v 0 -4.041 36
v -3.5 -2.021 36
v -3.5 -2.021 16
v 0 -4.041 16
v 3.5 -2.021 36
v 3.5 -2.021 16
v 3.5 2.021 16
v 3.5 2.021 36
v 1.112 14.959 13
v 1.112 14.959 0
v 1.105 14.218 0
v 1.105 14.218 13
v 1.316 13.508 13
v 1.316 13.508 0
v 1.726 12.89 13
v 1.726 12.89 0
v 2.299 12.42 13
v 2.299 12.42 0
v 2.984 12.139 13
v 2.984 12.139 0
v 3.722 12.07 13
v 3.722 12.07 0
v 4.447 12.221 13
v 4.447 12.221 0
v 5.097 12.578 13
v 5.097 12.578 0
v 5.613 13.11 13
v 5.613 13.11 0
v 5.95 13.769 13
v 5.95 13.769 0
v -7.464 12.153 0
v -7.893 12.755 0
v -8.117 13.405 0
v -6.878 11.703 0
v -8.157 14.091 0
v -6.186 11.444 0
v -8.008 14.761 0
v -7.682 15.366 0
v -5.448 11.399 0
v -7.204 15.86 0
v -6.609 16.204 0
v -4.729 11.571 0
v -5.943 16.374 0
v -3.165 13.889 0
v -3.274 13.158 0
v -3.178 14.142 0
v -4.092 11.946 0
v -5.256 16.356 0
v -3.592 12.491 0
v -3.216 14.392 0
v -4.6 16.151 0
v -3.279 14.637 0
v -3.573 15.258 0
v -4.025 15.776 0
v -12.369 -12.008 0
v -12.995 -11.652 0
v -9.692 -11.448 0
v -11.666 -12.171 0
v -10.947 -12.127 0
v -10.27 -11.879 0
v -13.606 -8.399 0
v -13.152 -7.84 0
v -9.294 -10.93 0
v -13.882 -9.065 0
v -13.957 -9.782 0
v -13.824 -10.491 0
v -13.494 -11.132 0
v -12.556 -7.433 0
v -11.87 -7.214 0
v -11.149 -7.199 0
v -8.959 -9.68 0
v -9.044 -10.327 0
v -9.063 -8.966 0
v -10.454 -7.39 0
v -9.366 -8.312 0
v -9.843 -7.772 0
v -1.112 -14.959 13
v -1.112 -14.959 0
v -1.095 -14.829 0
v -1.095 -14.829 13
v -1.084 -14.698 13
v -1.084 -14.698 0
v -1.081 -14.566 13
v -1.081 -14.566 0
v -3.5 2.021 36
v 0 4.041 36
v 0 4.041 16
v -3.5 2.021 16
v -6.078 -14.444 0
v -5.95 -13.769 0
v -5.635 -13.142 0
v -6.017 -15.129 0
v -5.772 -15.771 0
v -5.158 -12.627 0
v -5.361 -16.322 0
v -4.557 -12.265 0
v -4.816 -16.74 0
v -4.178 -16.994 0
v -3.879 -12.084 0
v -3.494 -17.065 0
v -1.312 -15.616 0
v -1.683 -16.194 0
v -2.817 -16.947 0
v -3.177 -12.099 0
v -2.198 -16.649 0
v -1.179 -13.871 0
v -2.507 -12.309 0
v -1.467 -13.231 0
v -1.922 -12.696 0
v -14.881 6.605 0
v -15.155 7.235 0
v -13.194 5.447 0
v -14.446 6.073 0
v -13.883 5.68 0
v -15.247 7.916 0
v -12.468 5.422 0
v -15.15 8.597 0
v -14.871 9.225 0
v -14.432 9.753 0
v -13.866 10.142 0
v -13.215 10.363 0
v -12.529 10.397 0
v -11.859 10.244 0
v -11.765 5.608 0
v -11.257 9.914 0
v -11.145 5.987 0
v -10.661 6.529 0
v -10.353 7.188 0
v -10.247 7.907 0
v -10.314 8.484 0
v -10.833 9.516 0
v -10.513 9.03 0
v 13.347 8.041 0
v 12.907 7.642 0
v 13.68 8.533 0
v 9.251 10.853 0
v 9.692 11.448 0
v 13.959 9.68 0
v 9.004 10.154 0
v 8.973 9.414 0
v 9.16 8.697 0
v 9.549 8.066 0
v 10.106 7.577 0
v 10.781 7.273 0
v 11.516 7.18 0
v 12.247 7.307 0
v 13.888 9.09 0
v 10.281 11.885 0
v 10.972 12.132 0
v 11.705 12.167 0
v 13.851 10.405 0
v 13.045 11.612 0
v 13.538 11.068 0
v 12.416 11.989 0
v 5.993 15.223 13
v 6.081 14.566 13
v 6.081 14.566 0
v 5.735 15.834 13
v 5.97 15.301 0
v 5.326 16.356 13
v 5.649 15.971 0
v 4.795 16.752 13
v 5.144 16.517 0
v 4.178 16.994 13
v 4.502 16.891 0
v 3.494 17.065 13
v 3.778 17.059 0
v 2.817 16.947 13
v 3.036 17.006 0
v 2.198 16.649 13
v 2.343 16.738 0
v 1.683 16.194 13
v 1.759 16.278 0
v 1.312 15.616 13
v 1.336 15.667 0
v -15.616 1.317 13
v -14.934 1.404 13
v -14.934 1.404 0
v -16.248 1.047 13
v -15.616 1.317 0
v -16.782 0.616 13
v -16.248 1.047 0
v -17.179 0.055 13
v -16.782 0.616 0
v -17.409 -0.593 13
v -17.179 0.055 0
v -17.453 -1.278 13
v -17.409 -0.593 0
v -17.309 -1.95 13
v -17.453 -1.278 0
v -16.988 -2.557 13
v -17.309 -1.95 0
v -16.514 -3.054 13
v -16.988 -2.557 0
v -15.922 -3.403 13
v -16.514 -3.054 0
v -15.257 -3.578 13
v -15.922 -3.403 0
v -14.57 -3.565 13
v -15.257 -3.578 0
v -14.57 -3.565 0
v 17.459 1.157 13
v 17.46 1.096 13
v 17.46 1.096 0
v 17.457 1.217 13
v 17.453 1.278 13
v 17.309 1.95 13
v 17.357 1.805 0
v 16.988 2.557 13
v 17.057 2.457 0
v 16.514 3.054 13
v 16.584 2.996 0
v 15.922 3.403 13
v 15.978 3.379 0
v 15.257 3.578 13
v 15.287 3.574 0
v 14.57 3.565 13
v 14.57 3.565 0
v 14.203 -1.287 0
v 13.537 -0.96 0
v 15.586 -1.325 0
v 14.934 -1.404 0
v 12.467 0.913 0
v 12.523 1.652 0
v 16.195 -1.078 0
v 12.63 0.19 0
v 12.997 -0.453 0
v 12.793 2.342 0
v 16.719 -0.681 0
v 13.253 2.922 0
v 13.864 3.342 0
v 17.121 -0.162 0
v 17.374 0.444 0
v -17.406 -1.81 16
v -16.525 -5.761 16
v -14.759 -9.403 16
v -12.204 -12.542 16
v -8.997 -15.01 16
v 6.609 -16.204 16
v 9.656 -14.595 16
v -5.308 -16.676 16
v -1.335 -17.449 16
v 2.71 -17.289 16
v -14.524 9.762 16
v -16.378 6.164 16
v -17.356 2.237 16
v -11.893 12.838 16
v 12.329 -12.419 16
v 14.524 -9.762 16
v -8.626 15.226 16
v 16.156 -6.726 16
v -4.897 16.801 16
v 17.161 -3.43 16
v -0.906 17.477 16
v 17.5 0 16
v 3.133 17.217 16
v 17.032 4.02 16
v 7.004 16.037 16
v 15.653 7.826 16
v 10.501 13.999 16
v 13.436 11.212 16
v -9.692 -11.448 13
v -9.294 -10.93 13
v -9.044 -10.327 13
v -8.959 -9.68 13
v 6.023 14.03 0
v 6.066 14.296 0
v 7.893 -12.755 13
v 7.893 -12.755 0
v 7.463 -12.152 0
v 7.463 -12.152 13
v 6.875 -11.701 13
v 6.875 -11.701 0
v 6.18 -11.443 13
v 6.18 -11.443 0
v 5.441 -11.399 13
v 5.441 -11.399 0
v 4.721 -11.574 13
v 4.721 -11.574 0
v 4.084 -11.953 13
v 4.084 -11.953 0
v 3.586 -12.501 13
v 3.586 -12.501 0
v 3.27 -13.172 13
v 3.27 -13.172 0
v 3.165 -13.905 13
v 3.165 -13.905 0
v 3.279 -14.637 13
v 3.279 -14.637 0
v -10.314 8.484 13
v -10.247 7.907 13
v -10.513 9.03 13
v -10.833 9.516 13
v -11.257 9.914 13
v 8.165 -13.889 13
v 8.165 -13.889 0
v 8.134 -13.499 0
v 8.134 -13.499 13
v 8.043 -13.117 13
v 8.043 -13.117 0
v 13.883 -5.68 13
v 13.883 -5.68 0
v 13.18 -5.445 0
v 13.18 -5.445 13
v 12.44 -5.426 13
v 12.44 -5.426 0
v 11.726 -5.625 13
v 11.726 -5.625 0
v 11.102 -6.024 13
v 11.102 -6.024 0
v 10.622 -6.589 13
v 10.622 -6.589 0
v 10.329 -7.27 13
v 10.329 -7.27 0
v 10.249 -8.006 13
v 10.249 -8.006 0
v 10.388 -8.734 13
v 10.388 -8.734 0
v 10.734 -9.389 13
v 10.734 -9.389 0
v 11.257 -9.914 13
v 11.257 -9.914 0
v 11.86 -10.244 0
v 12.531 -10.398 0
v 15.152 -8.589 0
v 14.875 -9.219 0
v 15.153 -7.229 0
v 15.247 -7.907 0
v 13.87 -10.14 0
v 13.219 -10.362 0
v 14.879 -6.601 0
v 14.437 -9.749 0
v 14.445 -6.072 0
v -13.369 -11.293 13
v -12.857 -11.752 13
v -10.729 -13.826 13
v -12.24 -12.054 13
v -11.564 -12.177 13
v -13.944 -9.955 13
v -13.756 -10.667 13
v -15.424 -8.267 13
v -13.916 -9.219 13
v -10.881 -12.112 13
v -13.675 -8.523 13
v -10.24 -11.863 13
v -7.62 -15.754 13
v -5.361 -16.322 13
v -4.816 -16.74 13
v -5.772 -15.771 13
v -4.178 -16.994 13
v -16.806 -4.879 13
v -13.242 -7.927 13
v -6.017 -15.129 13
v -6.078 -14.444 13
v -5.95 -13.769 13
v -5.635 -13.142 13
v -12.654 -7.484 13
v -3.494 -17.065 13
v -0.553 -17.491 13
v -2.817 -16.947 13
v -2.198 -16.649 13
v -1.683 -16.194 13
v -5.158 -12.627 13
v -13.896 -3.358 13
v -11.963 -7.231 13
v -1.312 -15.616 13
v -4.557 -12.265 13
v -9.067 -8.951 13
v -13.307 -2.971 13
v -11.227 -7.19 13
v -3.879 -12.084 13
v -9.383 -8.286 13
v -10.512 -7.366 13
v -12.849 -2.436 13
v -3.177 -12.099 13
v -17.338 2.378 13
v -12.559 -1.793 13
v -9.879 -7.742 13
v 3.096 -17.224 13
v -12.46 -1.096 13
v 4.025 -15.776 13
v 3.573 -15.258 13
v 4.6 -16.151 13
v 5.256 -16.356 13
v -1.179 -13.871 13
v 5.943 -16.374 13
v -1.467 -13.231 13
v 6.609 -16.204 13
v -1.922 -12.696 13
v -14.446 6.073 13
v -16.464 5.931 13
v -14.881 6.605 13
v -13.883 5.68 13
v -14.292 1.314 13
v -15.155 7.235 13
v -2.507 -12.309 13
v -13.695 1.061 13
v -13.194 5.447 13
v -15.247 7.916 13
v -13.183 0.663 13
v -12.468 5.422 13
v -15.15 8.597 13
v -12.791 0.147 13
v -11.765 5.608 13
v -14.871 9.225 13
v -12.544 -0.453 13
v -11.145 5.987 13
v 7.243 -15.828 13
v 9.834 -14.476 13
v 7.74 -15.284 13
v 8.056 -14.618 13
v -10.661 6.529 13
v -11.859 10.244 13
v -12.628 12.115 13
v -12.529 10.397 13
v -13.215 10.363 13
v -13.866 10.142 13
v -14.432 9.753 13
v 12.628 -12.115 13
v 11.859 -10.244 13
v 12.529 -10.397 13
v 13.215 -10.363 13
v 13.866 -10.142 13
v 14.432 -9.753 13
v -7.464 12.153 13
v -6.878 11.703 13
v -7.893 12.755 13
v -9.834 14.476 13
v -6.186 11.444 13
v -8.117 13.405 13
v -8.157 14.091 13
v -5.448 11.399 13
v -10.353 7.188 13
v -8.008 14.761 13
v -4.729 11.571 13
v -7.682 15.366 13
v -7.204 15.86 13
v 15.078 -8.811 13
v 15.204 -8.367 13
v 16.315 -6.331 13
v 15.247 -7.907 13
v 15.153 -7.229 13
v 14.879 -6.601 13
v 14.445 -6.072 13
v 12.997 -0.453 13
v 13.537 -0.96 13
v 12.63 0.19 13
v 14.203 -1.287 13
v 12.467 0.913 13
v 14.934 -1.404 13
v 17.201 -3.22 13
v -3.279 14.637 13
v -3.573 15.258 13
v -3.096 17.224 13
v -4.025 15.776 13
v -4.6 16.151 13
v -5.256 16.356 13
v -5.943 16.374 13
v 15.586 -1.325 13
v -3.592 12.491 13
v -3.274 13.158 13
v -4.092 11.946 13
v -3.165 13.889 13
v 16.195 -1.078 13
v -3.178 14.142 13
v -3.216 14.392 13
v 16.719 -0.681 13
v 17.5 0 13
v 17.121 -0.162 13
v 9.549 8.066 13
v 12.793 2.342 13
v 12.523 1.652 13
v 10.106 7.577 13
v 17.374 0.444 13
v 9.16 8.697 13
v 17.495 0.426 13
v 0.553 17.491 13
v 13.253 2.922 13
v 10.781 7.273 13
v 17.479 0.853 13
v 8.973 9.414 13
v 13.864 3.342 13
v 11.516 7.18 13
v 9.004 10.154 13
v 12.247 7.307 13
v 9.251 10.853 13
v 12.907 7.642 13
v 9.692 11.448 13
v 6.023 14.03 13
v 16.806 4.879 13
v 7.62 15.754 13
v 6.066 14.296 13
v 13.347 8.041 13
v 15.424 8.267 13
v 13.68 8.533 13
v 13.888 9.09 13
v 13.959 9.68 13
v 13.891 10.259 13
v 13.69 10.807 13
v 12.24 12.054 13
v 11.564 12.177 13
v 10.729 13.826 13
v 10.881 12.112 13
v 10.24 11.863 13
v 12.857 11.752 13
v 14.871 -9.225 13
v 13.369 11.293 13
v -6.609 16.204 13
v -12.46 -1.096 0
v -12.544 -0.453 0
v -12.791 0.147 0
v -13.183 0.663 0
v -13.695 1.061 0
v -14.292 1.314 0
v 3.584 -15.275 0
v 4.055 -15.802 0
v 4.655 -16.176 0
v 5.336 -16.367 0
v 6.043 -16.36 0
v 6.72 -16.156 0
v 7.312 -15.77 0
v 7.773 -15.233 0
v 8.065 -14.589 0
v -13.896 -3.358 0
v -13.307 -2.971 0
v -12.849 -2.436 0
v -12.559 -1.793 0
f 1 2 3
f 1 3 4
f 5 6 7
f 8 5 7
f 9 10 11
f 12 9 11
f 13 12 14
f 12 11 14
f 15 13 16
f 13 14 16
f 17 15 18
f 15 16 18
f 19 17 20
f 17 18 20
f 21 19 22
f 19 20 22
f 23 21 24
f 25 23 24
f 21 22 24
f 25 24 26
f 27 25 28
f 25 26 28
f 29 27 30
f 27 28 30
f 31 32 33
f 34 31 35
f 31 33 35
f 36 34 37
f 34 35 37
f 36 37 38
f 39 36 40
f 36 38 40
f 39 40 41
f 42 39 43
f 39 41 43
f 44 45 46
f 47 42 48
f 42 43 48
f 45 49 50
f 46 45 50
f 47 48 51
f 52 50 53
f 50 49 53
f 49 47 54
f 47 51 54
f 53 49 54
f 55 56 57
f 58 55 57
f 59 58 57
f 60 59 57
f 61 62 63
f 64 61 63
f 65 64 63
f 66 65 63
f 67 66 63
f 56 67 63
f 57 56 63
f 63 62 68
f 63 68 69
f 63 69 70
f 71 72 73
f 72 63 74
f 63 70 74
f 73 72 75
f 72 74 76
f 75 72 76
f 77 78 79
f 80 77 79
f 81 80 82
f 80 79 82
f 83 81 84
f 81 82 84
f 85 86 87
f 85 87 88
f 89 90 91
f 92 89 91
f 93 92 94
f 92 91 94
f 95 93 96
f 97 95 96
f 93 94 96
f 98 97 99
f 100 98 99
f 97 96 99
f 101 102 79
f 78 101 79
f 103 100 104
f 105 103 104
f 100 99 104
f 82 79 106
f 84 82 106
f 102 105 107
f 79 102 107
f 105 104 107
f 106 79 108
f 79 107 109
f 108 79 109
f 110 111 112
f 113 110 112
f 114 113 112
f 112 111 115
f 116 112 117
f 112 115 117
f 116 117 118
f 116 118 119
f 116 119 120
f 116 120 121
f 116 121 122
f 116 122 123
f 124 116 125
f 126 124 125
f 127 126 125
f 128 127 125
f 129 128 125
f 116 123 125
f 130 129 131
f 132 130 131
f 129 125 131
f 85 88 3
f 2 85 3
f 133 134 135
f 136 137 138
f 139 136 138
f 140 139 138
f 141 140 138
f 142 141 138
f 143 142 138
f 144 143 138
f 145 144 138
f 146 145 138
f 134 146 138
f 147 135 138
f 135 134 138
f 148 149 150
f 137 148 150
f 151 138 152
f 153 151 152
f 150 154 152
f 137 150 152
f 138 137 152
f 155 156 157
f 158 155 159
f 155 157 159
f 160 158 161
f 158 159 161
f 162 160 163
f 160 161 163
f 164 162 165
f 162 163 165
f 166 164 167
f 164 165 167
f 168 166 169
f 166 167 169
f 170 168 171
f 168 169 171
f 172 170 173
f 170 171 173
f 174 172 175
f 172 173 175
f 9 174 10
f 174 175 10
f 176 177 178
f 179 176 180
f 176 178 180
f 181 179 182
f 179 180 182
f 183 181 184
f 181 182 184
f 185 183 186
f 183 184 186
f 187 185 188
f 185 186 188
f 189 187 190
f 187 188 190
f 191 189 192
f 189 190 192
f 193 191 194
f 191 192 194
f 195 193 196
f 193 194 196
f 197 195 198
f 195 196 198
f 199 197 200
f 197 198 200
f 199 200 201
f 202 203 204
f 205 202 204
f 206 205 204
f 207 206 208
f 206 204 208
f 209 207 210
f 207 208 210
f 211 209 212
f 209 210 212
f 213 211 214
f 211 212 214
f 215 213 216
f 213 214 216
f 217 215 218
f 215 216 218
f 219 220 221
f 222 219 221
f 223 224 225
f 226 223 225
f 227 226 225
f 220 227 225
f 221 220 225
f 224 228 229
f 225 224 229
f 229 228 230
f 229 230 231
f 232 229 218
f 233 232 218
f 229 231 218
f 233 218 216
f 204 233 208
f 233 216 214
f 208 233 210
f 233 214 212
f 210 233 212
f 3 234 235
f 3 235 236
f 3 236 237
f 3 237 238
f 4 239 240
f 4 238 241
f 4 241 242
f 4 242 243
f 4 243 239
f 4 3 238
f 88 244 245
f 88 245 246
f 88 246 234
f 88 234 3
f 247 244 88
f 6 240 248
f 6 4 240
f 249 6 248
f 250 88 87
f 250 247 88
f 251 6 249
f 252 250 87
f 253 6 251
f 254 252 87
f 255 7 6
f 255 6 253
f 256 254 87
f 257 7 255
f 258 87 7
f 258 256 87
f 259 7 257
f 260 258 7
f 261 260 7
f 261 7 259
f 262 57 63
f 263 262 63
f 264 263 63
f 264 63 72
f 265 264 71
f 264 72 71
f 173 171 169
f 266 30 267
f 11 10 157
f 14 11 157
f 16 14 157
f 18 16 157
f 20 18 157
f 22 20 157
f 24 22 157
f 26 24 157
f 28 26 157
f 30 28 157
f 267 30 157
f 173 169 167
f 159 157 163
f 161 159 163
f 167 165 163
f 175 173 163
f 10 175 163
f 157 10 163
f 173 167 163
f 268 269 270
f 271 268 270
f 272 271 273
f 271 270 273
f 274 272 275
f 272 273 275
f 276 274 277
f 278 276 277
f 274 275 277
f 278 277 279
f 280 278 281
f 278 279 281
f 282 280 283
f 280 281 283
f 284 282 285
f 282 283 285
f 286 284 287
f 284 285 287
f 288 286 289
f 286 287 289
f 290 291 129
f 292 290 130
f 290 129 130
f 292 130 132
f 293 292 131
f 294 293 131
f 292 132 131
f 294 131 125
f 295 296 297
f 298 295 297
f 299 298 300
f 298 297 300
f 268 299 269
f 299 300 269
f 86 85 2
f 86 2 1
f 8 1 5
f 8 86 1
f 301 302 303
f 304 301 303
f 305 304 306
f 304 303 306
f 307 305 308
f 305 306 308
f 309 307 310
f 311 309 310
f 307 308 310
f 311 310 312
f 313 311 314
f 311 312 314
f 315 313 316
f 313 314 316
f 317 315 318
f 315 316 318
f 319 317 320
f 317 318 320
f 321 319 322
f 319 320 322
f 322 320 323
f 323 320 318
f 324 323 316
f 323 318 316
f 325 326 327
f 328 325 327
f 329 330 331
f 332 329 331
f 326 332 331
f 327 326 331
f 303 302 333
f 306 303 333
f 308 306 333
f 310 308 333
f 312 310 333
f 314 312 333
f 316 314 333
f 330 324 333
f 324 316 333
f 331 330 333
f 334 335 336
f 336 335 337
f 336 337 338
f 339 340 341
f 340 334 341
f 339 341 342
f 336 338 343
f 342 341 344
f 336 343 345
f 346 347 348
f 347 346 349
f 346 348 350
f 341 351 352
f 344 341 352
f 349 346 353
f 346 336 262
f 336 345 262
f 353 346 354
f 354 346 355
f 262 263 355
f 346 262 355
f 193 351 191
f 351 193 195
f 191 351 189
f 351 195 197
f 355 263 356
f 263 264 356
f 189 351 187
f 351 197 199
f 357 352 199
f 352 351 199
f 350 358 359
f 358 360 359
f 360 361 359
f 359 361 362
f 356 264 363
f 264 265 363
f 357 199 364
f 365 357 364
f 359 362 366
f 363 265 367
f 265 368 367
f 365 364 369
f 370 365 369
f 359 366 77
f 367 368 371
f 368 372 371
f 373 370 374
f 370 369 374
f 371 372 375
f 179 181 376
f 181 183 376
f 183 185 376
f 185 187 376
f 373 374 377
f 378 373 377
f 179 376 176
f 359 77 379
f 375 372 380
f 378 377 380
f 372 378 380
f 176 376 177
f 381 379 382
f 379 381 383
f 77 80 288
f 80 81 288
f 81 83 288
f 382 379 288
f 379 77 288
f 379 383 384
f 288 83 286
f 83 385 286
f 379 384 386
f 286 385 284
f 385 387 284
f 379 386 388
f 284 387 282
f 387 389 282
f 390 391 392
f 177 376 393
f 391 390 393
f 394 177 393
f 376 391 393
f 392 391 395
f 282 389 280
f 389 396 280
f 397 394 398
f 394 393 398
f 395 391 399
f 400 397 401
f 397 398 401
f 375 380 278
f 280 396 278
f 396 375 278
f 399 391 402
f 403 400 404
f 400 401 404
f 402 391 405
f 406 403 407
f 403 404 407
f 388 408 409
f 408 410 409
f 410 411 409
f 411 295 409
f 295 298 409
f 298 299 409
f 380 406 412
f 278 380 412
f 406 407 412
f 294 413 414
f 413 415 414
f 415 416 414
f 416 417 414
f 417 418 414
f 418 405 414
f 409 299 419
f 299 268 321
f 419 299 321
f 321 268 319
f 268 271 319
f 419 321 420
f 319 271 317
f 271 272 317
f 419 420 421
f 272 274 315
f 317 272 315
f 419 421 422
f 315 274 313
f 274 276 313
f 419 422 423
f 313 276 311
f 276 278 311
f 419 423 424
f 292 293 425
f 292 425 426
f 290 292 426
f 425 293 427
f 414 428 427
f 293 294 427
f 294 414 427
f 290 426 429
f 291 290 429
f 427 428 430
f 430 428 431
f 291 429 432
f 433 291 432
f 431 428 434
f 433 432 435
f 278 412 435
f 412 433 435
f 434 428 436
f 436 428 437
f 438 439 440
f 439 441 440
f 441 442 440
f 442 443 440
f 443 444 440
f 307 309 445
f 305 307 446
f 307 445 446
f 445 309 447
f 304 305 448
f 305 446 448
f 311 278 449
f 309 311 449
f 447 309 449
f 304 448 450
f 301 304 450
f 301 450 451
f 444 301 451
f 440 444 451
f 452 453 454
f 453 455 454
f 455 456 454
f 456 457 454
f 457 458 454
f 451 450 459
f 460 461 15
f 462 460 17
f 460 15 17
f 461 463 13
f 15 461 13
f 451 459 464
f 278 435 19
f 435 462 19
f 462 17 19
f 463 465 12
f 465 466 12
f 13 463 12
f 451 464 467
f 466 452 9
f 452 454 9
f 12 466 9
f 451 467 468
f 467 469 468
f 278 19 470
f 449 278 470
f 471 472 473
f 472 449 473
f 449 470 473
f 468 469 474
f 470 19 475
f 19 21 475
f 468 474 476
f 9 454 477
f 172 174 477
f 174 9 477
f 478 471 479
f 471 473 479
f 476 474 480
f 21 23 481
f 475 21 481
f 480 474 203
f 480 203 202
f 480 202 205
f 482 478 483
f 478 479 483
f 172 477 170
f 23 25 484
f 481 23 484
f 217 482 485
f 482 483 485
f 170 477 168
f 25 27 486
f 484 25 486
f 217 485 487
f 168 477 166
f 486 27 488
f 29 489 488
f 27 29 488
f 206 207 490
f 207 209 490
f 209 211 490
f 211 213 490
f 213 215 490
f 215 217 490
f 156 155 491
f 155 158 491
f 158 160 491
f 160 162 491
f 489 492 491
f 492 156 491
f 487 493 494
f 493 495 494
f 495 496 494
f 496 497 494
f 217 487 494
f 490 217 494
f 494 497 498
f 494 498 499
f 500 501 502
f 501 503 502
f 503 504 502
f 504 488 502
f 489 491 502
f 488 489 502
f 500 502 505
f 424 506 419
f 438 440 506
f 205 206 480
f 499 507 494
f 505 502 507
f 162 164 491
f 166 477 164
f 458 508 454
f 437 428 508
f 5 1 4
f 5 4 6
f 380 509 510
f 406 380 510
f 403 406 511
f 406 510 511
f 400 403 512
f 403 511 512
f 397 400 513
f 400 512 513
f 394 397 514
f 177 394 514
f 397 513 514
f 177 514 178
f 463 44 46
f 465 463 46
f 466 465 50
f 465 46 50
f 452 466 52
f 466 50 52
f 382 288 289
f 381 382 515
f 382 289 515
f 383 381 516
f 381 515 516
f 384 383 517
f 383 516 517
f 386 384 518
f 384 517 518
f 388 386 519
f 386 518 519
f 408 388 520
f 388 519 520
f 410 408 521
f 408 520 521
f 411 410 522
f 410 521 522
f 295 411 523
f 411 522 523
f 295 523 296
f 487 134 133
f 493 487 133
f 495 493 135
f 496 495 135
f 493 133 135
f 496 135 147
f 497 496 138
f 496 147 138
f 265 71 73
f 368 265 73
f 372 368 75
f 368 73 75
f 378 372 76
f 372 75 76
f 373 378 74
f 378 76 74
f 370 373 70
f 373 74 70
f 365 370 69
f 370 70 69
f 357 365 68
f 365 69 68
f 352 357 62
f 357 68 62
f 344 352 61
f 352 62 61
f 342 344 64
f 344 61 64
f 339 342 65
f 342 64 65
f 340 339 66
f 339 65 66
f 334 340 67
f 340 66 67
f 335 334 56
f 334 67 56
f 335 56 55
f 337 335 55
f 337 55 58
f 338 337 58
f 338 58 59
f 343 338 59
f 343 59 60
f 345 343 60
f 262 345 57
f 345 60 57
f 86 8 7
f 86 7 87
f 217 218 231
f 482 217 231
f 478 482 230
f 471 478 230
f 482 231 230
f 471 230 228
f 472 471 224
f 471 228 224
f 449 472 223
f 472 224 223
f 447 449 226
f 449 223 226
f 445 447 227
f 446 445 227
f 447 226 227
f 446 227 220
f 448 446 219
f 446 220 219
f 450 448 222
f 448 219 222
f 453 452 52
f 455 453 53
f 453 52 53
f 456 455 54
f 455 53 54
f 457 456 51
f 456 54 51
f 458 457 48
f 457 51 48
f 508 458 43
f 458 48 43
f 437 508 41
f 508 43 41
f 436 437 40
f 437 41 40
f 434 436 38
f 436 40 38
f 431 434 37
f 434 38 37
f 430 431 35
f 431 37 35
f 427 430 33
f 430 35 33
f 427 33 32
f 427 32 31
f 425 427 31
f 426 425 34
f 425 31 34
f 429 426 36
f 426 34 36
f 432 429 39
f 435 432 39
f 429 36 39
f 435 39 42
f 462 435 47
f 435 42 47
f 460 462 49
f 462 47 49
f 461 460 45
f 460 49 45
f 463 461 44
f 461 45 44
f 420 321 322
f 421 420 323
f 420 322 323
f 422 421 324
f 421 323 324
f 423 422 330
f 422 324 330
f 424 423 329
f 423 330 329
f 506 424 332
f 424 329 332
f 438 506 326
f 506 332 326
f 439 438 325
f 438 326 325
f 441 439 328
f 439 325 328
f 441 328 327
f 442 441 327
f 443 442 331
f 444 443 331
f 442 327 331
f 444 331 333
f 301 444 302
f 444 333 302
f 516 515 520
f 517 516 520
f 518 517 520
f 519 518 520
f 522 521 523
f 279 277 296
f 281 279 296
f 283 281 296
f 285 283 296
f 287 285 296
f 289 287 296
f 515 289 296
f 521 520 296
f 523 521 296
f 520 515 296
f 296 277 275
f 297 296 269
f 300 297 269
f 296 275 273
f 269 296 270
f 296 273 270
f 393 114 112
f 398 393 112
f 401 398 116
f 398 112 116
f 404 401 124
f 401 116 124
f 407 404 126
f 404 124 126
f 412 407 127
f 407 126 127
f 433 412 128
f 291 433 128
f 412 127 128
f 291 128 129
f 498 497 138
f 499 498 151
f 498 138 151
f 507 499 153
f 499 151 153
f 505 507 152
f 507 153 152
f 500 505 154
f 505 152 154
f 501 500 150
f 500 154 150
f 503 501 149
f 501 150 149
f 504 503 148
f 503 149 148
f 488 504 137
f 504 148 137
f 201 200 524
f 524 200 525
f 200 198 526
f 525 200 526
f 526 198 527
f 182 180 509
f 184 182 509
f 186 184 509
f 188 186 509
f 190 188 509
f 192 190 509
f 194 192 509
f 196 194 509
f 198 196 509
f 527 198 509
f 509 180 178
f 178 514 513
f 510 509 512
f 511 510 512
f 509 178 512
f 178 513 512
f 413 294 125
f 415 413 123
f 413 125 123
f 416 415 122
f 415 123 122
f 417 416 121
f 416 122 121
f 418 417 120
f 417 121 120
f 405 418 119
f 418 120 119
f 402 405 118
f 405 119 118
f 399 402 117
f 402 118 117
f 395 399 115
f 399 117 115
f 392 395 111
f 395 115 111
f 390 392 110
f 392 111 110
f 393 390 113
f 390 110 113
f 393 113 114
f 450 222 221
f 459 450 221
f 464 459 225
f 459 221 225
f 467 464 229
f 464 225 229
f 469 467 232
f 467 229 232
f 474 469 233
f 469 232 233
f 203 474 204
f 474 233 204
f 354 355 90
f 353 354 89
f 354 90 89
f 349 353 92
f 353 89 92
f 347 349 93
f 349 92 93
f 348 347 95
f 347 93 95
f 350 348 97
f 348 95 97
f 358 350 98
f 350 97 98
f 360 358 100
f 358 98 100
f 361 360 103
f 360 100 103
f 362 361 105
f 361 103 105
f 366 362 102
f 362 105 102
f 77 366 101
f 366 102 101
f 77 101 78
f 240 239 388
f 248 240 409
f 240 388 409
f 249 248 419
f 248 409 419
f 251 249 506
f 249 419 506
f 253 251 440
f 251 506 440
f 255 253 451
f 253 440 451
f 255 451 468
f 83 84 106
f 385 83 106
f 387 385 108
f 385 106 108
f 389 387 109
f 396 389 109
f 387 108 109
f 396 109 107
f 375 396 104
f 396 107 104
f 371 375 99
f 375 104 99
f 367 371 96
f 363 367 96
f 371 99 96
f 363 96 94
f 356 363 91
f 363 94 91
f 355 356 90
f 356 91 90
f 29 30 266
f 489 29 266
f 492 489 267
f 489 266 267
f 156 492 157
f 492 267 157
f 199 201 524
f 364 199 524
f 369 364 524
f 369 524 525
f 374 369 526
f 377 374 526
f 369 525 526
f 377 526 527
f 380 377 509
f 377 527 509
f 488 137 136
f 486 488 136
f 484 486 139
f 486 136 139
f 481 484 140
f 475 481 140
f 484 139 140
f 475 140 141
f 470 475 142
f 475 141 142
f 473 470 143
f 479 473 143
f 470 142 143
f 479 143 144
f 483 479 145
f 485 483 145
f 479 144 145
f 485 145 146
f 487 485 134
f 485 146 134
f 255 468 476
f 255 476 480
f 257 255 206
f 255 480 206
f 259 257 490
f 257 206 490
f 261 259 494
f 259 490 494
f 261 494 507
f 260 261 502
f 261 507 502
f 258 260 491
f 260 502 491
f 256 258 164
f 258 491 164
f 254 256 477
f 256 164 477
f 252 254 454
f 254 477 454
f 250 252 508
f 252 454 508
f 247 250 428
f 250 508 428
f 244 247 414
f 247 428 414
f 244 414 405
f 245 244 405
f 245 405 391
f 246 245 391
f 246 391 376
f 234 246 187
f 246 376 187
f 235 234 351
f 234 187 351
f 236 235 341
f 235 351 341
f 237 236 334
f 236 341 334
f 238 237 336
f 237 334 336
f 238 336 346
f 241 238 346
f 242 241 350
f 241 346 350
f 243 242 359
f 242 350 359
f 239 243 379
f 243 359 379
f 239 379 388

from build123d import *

# Parameters (mm, degrees)
F1_DEPTH = 13
F3_DEPTH = 3
F5_DEPTH = 20


with BuildPart() as f1:
    # F0 (on Top) → F1 (new body)
    with BuildSketch(Plane.XY):
        with BuildLine():
            ThreePointArc((-7.8930054645, 12.7554092344), (-5.664873312, 13.8891760144), (-3.2793835676, 14.6371323495))
            ThreePointArc((-3.2793835676, 14.6371323495), (-6.609018864, 16.2040386834), (-7.8930054645, 12.7554092344))
        make_face()
        with BuildLine():
            ThreePointArc((-3.164873312, 13.8891760144), (-3.1936666876, 14.2675116054), (-3.2793835676, 14.6371323495))
            ThreePointArc((-3.2793835676, 14.6371323495), (-5.664873312, 13.8891760144), (-7.8930054645, 12.7554092344))
            ThreePointArc((-7.8930054645, 12.7554092344), (-5.0819197895, 11.4580928832), (-3.164873312, 13.8891760144))
        make_face()
    extrude(amount=F1_DEPTH)



with BuildPart() as f1b:
    # F0 (on Top) → F1, piece 2 (new body)
    with BuildSketch(Plane.XY):
        with BuildLine():
            ThreePointArc((1.1118658775, 14.9587350491), (3.5808740473, 14.5663084224), (5.9504134936, 13.7692621173))
            ThreePointArc((5.9504134936, 13.7692621173), (6.0480433378, 14.1624821081), (6.0808740473, 14.5663084224))
            ThreePointArc((6.0808740473, 14.5663084224), (3.7776983033, 17.0585484214), (1.1118658775, 14.9587350491))
        make_face()
        with BuildLine():
            ThreePointArc((1.1118658775, 14.9587350491), (2.9840617061, 12.138590352), (5.9504134936, 13.7692621173))
            ThreePointArc((5.9504134936, 13.7692621173), (3.5808740473, 14.5663084224), (1.1118658775, 14.9587350491))
        make_face()
    extrude(amount=F1_DEPTH)


with BuildPart() as f1c:
    # F0 (on Top) → F1, piece 3 (new body)
    with BuildSketch(Plane.XY):
        with BuildLine():
            ThreePointArc((9.6920422452, 11.4483325038), (9.549041025, 8.0663384198), (12.9073548474, 7.6420017563))
            ThreePointArc((12.9073548474, 7.6420017563), (11.45884923, 9.6796061037), (9.6920422452, 11.4483325038))
        make_face()
        with BuildLine():
            ThreePointArc((9.6920422452, 11.4483325038), (11.45884923, 9.6796061037), (12.9073548474, 7.6420017563))
            ThreePointArc((12.9073548474, 7.6420017563), (13.6804774667, 8.5331472173), (13.95884923, 9.6796061037))
            ThreePointArc((13.95884923, 9.6796061037), (12.416184735, 11.9890451549), (9.6920422452, 11.4483325038))
        make_face()
    extrude(amount=F1_DEPTH)


with BuildPart() as f1d:
    # F0 (on Top) → F1, piece 4 (new body)
    with BuildSketch(Plane.XY):
        with BuildLine():
            ThreePointArc((14.9341253543, -1.4042435335), (14.9835222881, -0.7028939056), (15, 0))
            ThreePointArc((15, 0), (14.8921593202, 1.7954360982), (14.5701878956, 3.5650560565))
            ThreePointArc((14.5701878956, 3.5650560565), (12.4666112324, 0.9130193759), (14.9341253543, -1.4042435335))
        make_face()
        with BuildLine():
            ThreePointArc((14.5701878956, 3.5650560565), (14.8921593202, 1.7954360982), (15, 0))
            ThreePointArc((15, 0), (14.9835222881, -0.7028939056), (14.9341253543, -1.4042435335))
            ThreePointArc((14.9341253543, -1.4042435335), (16.7185522108, -0.6812448238), (17.4599334789, 1.0956232511))
            ThreePointArc((17.4599334789, 1.0956232511), (16.5840695634, 2.9961973694), (14.5701878956, 3.5650560565))
        make_face()
    extrude(amount=F1_DEPTH)


with BuildPart() as f1e:
    # F0 (on Top) → F1, piece 5 (new body)
    with BuildSketch(Plane.XY):
        with BuildLine():
            ThreePointArc((11.2565675682, -9.914115522), (12.7468316082, -7.9068504446), (13.8830169924, -5.6799506326))
            ThreePointArc((13.8830169924, -5.6799506326), (10.6223596735, -6.5890420372), (11.2565675682, -9.914115522))
        make_face()
        with BuildLine():
            ThreePointArc((15.2468316082, -7.9068504446), (14.8787865163, -6.601182696), (13.8830169924, -5.6799506326))
            ThreePointArc((13.8830169924, -5.6799506326), (12.7468316082, -7.9068504446), (11.2565675682, -9.914115522))
            ThreePointArc((11.2565675682, -9.914115522), (13.870294981, -10.1401954806), (15.2468316082, -7.9068504446))
        make_face()
    extrude(amount=F1_DEPTH)


with BuildPart() as f1f:
    # F0 (on Top) → F1, piece 6 (new body)
    with BuildSketch(Plane.XY):
        with BuildLine():
            ThreePointArc((3.2793835676, -14.6371323495), (5.664873312, -13.8891760144), (7.8930054645, -12.7554092344))
            ThreePointArc((7.8930054645, -12.7554092344), (4.72072776, -11.5743133453), (3.2793835676, -14.6371323495))
        make_face()
        with BuildLine():
            ThreePointArc((8.164873312, -13.8891760144), (8.0959564432, -13.3062224918), (7.8930054645, -12.7554092344))
            ThreePointArc((7.8930054645, -12.7554092344), (5.664873312, -13.8891760144), (3.2793835676, -14.6371323495))
            ThreePointArc((3.2793835676, -14.6371323495), (6.0432089031, -16.3603826388), (8.164873312, -13.8891760144))
        make_face()
    extrude(amount=F1_DEPTH)


with BuildPart() as f1g:
    # F0 (on Top) → F1, piece 7 (new body)
    with BuildSketch(Plane.XY):
        with BuildLine():
            ThreePointArc((-5.9504134936, -13.7692621173), (-4.1776863886, -16.9940264928), (-1.1118658775, -14.9587350491))
            ThreePointArc((-1.1118658775, -14.9587350491), (-3.5808740473, -14.5663084224), (-5.9504134936, -13.7692621173))
        make_face()
        with BuildLine():
            ThreePointArc((-5.9504134936, -13.7692621173), (-3.5808740473, -14.5663084224), (-1.1118658775, -14.9587350491))
            ThreePointArc((-1.1118658775, -14.9587350491), (-1.0886340484, -14.7631326784), (-1.0808740473, -14.5663084224))
            ThreePointArc((-1.0808740473, -14.5663084224), (-3.177047733, -12.099139132), (-5.9504134936, -13.7692621173))
        make_face()
    extrude(amount=F1_DEPTH)


with BuildPart() as f1h:
    # F0 (on Top) → F1, piece 8 (new body)
    with BuildSketch(Plane.XY):
        with BuildLine():
            ThreePointArc((-12.9073548474, -7.6420017563), (-13.3686574351, -11.2928737877), (-9.6920422452, -11.4483325038))
            ThreePointArc((-9.6920422452, -11.4483325038), (-11.45884923, -9.6796061037), (-12.9073548474, -7.6420017563))
        make_face()
        with BuildLine():
            ThreePointArc((-12.9073548474, -7.6420017563), (-11.45884923, -9.6796061037), (-9.6920422452, -11.4483325038))
            ThreePointArc((-9.6920422452, -11.4483325038), (-9.1494101789, -10.6369416086), (-8.95884923, -9.6796061037))
            ThreePointArc((-8.95884923, -9.6796061037), (-10.3123903436, -7.4579778671), (-12.9073548474, -7.6420017563))
        make_face()
    extrude(amount=F1_DEPTH)


with BuildPart() as f1i:
    # F0 (on Top) → F1, piece 9 (new body)
    with BuildSketch(Plane.XY):
        with BuildLine():
            ThreePointArc((-14.5701878956, -3.5650560565), (-14.9599334789, -1.0956232511), (-14.9341253543, 1.4042435335))
            ThreePointArc((-14.9341253543, 1.4042435335), (-17.4532557253, -1.2782271263), (-14.5701878956, -3.5650560565))
        make_face()
        with BuildLine():
            ThreePointArc((-12.4599334789, -1.0956232511), (-13.1830654039, 0.6629954809), (-14.9341253543, 1.4042435335))
            ThreePointArc((-14.9341253543, 1.4042435335), (-14.9599334789, -1.0956232511), (-14.5701878956, -3.5650560565))
            ThreePointArc((-14.5701878956, -3.5650560565), (-13.0593593606, -2.7197593356), (-12.4599334789, -1.0956232511))
        make_face()
    extrude(amount=F1_DEPTH)


with BuildPart() as f1j:
    # F0 (on Top) → F1, piece 10 (new body)
    with BuildSketch(Plane.XY):
        with BuildLine():
            ThreePointArc((-13.8830169924, 5.6799506326), (-12.7468316082, 7.9068504446), (-11.2565675682, 9.914115522))
            ThreePointArc((-11.2565675682, 9.914115522), (-14.8713035429, 9.224658852), (-13.8830169924, 5.6799506326))
        make_face()
        with BuildLine():
            ThreePointArc((-10.2468316082, 7.9068504446), (-10.5134865721, 9.0303138174), (-11.2565675682, 9.914115522))
            ThreePointArc((-11.2565675682, 9.914115522), (-12.7468316082, 7.9068504446), (-13.8830169924, 5.6799506326))
            ThreePointArc((-13.8830169924, 5.6799506326), (-11.4411638596, 5.7748955365), (-10.2468316082, 7.9068504446))
        make_face()
    extrude(amount=F1_DEPTH)


with BuildPart() as f1_1:
    add(f1.part)

    add(f1b.part)  # F3 merges F1b

    add(f1c.part)  # F3 merges F1c

    add(f1d.part)  # F3 merges F1d

    add(f1e.part)  # F3 merges F1e

    add(f1f.part)  # F3 merges F1f

    add(f1g.part)  # F3 merges F1g

    add(f1h.part)  # F3 merges F1h

    add(f1i.part)  # F3 merges F1i

    add(f1j.part)  # F3 merges F1j
    # F2 (on face) → F3 (join)
    with BuildSketch(Plane.XY.offset(13)):
        with BuildLine():
            ThreePointArc((6.6090187797, -16.2040387179), (14.5242526253, -9.7619714032), (17.5, 0))
            ThreePointArc((17.5, 0), (-14.5242526253, 9.7619714032), (6.6090187797, -16.2040387179))
        make_face()
        with BuildLine():
            ThreePointArc((8.164873312, -13.8891760144), (7.7397665224, -15.2837433901), (6.6090187797, -16.2040387179))
            ThreePointArc((6.6090187797, -16.2040387179), (3.5899801016, -12.4946086387), (8.164873312, -13.8891760144))
        make_face(mode=Mode.SUBTRACT)
        with BuildLine():
            ThreePointArc((8.164873312, -13.8891760144), (3.5899801016, -12.4946086387), (6.6090187797, -16.2040387179))
            ThreePointArc((6.6090187797, -16.2040387179), (7.7397665224, -15.2837433901), (8.164873312, -13.8891760144))
        make_face()
    extrude(amount=F3_DEPTH)

    # F4 (on face) → F5 (join)
    with BuildSketch(Plane.XY.offset(16)):
        Polygon((3.5, -2.0207259422), (3.5, 2.0207259422), (0, 4.0414518843), (-3.5, 2.0207259422), (-3.5, -2.0207259422), (0, -4.0414518843), align=None)
    extrude(amount=F5_DEPTH)


solid = f1_1.part
